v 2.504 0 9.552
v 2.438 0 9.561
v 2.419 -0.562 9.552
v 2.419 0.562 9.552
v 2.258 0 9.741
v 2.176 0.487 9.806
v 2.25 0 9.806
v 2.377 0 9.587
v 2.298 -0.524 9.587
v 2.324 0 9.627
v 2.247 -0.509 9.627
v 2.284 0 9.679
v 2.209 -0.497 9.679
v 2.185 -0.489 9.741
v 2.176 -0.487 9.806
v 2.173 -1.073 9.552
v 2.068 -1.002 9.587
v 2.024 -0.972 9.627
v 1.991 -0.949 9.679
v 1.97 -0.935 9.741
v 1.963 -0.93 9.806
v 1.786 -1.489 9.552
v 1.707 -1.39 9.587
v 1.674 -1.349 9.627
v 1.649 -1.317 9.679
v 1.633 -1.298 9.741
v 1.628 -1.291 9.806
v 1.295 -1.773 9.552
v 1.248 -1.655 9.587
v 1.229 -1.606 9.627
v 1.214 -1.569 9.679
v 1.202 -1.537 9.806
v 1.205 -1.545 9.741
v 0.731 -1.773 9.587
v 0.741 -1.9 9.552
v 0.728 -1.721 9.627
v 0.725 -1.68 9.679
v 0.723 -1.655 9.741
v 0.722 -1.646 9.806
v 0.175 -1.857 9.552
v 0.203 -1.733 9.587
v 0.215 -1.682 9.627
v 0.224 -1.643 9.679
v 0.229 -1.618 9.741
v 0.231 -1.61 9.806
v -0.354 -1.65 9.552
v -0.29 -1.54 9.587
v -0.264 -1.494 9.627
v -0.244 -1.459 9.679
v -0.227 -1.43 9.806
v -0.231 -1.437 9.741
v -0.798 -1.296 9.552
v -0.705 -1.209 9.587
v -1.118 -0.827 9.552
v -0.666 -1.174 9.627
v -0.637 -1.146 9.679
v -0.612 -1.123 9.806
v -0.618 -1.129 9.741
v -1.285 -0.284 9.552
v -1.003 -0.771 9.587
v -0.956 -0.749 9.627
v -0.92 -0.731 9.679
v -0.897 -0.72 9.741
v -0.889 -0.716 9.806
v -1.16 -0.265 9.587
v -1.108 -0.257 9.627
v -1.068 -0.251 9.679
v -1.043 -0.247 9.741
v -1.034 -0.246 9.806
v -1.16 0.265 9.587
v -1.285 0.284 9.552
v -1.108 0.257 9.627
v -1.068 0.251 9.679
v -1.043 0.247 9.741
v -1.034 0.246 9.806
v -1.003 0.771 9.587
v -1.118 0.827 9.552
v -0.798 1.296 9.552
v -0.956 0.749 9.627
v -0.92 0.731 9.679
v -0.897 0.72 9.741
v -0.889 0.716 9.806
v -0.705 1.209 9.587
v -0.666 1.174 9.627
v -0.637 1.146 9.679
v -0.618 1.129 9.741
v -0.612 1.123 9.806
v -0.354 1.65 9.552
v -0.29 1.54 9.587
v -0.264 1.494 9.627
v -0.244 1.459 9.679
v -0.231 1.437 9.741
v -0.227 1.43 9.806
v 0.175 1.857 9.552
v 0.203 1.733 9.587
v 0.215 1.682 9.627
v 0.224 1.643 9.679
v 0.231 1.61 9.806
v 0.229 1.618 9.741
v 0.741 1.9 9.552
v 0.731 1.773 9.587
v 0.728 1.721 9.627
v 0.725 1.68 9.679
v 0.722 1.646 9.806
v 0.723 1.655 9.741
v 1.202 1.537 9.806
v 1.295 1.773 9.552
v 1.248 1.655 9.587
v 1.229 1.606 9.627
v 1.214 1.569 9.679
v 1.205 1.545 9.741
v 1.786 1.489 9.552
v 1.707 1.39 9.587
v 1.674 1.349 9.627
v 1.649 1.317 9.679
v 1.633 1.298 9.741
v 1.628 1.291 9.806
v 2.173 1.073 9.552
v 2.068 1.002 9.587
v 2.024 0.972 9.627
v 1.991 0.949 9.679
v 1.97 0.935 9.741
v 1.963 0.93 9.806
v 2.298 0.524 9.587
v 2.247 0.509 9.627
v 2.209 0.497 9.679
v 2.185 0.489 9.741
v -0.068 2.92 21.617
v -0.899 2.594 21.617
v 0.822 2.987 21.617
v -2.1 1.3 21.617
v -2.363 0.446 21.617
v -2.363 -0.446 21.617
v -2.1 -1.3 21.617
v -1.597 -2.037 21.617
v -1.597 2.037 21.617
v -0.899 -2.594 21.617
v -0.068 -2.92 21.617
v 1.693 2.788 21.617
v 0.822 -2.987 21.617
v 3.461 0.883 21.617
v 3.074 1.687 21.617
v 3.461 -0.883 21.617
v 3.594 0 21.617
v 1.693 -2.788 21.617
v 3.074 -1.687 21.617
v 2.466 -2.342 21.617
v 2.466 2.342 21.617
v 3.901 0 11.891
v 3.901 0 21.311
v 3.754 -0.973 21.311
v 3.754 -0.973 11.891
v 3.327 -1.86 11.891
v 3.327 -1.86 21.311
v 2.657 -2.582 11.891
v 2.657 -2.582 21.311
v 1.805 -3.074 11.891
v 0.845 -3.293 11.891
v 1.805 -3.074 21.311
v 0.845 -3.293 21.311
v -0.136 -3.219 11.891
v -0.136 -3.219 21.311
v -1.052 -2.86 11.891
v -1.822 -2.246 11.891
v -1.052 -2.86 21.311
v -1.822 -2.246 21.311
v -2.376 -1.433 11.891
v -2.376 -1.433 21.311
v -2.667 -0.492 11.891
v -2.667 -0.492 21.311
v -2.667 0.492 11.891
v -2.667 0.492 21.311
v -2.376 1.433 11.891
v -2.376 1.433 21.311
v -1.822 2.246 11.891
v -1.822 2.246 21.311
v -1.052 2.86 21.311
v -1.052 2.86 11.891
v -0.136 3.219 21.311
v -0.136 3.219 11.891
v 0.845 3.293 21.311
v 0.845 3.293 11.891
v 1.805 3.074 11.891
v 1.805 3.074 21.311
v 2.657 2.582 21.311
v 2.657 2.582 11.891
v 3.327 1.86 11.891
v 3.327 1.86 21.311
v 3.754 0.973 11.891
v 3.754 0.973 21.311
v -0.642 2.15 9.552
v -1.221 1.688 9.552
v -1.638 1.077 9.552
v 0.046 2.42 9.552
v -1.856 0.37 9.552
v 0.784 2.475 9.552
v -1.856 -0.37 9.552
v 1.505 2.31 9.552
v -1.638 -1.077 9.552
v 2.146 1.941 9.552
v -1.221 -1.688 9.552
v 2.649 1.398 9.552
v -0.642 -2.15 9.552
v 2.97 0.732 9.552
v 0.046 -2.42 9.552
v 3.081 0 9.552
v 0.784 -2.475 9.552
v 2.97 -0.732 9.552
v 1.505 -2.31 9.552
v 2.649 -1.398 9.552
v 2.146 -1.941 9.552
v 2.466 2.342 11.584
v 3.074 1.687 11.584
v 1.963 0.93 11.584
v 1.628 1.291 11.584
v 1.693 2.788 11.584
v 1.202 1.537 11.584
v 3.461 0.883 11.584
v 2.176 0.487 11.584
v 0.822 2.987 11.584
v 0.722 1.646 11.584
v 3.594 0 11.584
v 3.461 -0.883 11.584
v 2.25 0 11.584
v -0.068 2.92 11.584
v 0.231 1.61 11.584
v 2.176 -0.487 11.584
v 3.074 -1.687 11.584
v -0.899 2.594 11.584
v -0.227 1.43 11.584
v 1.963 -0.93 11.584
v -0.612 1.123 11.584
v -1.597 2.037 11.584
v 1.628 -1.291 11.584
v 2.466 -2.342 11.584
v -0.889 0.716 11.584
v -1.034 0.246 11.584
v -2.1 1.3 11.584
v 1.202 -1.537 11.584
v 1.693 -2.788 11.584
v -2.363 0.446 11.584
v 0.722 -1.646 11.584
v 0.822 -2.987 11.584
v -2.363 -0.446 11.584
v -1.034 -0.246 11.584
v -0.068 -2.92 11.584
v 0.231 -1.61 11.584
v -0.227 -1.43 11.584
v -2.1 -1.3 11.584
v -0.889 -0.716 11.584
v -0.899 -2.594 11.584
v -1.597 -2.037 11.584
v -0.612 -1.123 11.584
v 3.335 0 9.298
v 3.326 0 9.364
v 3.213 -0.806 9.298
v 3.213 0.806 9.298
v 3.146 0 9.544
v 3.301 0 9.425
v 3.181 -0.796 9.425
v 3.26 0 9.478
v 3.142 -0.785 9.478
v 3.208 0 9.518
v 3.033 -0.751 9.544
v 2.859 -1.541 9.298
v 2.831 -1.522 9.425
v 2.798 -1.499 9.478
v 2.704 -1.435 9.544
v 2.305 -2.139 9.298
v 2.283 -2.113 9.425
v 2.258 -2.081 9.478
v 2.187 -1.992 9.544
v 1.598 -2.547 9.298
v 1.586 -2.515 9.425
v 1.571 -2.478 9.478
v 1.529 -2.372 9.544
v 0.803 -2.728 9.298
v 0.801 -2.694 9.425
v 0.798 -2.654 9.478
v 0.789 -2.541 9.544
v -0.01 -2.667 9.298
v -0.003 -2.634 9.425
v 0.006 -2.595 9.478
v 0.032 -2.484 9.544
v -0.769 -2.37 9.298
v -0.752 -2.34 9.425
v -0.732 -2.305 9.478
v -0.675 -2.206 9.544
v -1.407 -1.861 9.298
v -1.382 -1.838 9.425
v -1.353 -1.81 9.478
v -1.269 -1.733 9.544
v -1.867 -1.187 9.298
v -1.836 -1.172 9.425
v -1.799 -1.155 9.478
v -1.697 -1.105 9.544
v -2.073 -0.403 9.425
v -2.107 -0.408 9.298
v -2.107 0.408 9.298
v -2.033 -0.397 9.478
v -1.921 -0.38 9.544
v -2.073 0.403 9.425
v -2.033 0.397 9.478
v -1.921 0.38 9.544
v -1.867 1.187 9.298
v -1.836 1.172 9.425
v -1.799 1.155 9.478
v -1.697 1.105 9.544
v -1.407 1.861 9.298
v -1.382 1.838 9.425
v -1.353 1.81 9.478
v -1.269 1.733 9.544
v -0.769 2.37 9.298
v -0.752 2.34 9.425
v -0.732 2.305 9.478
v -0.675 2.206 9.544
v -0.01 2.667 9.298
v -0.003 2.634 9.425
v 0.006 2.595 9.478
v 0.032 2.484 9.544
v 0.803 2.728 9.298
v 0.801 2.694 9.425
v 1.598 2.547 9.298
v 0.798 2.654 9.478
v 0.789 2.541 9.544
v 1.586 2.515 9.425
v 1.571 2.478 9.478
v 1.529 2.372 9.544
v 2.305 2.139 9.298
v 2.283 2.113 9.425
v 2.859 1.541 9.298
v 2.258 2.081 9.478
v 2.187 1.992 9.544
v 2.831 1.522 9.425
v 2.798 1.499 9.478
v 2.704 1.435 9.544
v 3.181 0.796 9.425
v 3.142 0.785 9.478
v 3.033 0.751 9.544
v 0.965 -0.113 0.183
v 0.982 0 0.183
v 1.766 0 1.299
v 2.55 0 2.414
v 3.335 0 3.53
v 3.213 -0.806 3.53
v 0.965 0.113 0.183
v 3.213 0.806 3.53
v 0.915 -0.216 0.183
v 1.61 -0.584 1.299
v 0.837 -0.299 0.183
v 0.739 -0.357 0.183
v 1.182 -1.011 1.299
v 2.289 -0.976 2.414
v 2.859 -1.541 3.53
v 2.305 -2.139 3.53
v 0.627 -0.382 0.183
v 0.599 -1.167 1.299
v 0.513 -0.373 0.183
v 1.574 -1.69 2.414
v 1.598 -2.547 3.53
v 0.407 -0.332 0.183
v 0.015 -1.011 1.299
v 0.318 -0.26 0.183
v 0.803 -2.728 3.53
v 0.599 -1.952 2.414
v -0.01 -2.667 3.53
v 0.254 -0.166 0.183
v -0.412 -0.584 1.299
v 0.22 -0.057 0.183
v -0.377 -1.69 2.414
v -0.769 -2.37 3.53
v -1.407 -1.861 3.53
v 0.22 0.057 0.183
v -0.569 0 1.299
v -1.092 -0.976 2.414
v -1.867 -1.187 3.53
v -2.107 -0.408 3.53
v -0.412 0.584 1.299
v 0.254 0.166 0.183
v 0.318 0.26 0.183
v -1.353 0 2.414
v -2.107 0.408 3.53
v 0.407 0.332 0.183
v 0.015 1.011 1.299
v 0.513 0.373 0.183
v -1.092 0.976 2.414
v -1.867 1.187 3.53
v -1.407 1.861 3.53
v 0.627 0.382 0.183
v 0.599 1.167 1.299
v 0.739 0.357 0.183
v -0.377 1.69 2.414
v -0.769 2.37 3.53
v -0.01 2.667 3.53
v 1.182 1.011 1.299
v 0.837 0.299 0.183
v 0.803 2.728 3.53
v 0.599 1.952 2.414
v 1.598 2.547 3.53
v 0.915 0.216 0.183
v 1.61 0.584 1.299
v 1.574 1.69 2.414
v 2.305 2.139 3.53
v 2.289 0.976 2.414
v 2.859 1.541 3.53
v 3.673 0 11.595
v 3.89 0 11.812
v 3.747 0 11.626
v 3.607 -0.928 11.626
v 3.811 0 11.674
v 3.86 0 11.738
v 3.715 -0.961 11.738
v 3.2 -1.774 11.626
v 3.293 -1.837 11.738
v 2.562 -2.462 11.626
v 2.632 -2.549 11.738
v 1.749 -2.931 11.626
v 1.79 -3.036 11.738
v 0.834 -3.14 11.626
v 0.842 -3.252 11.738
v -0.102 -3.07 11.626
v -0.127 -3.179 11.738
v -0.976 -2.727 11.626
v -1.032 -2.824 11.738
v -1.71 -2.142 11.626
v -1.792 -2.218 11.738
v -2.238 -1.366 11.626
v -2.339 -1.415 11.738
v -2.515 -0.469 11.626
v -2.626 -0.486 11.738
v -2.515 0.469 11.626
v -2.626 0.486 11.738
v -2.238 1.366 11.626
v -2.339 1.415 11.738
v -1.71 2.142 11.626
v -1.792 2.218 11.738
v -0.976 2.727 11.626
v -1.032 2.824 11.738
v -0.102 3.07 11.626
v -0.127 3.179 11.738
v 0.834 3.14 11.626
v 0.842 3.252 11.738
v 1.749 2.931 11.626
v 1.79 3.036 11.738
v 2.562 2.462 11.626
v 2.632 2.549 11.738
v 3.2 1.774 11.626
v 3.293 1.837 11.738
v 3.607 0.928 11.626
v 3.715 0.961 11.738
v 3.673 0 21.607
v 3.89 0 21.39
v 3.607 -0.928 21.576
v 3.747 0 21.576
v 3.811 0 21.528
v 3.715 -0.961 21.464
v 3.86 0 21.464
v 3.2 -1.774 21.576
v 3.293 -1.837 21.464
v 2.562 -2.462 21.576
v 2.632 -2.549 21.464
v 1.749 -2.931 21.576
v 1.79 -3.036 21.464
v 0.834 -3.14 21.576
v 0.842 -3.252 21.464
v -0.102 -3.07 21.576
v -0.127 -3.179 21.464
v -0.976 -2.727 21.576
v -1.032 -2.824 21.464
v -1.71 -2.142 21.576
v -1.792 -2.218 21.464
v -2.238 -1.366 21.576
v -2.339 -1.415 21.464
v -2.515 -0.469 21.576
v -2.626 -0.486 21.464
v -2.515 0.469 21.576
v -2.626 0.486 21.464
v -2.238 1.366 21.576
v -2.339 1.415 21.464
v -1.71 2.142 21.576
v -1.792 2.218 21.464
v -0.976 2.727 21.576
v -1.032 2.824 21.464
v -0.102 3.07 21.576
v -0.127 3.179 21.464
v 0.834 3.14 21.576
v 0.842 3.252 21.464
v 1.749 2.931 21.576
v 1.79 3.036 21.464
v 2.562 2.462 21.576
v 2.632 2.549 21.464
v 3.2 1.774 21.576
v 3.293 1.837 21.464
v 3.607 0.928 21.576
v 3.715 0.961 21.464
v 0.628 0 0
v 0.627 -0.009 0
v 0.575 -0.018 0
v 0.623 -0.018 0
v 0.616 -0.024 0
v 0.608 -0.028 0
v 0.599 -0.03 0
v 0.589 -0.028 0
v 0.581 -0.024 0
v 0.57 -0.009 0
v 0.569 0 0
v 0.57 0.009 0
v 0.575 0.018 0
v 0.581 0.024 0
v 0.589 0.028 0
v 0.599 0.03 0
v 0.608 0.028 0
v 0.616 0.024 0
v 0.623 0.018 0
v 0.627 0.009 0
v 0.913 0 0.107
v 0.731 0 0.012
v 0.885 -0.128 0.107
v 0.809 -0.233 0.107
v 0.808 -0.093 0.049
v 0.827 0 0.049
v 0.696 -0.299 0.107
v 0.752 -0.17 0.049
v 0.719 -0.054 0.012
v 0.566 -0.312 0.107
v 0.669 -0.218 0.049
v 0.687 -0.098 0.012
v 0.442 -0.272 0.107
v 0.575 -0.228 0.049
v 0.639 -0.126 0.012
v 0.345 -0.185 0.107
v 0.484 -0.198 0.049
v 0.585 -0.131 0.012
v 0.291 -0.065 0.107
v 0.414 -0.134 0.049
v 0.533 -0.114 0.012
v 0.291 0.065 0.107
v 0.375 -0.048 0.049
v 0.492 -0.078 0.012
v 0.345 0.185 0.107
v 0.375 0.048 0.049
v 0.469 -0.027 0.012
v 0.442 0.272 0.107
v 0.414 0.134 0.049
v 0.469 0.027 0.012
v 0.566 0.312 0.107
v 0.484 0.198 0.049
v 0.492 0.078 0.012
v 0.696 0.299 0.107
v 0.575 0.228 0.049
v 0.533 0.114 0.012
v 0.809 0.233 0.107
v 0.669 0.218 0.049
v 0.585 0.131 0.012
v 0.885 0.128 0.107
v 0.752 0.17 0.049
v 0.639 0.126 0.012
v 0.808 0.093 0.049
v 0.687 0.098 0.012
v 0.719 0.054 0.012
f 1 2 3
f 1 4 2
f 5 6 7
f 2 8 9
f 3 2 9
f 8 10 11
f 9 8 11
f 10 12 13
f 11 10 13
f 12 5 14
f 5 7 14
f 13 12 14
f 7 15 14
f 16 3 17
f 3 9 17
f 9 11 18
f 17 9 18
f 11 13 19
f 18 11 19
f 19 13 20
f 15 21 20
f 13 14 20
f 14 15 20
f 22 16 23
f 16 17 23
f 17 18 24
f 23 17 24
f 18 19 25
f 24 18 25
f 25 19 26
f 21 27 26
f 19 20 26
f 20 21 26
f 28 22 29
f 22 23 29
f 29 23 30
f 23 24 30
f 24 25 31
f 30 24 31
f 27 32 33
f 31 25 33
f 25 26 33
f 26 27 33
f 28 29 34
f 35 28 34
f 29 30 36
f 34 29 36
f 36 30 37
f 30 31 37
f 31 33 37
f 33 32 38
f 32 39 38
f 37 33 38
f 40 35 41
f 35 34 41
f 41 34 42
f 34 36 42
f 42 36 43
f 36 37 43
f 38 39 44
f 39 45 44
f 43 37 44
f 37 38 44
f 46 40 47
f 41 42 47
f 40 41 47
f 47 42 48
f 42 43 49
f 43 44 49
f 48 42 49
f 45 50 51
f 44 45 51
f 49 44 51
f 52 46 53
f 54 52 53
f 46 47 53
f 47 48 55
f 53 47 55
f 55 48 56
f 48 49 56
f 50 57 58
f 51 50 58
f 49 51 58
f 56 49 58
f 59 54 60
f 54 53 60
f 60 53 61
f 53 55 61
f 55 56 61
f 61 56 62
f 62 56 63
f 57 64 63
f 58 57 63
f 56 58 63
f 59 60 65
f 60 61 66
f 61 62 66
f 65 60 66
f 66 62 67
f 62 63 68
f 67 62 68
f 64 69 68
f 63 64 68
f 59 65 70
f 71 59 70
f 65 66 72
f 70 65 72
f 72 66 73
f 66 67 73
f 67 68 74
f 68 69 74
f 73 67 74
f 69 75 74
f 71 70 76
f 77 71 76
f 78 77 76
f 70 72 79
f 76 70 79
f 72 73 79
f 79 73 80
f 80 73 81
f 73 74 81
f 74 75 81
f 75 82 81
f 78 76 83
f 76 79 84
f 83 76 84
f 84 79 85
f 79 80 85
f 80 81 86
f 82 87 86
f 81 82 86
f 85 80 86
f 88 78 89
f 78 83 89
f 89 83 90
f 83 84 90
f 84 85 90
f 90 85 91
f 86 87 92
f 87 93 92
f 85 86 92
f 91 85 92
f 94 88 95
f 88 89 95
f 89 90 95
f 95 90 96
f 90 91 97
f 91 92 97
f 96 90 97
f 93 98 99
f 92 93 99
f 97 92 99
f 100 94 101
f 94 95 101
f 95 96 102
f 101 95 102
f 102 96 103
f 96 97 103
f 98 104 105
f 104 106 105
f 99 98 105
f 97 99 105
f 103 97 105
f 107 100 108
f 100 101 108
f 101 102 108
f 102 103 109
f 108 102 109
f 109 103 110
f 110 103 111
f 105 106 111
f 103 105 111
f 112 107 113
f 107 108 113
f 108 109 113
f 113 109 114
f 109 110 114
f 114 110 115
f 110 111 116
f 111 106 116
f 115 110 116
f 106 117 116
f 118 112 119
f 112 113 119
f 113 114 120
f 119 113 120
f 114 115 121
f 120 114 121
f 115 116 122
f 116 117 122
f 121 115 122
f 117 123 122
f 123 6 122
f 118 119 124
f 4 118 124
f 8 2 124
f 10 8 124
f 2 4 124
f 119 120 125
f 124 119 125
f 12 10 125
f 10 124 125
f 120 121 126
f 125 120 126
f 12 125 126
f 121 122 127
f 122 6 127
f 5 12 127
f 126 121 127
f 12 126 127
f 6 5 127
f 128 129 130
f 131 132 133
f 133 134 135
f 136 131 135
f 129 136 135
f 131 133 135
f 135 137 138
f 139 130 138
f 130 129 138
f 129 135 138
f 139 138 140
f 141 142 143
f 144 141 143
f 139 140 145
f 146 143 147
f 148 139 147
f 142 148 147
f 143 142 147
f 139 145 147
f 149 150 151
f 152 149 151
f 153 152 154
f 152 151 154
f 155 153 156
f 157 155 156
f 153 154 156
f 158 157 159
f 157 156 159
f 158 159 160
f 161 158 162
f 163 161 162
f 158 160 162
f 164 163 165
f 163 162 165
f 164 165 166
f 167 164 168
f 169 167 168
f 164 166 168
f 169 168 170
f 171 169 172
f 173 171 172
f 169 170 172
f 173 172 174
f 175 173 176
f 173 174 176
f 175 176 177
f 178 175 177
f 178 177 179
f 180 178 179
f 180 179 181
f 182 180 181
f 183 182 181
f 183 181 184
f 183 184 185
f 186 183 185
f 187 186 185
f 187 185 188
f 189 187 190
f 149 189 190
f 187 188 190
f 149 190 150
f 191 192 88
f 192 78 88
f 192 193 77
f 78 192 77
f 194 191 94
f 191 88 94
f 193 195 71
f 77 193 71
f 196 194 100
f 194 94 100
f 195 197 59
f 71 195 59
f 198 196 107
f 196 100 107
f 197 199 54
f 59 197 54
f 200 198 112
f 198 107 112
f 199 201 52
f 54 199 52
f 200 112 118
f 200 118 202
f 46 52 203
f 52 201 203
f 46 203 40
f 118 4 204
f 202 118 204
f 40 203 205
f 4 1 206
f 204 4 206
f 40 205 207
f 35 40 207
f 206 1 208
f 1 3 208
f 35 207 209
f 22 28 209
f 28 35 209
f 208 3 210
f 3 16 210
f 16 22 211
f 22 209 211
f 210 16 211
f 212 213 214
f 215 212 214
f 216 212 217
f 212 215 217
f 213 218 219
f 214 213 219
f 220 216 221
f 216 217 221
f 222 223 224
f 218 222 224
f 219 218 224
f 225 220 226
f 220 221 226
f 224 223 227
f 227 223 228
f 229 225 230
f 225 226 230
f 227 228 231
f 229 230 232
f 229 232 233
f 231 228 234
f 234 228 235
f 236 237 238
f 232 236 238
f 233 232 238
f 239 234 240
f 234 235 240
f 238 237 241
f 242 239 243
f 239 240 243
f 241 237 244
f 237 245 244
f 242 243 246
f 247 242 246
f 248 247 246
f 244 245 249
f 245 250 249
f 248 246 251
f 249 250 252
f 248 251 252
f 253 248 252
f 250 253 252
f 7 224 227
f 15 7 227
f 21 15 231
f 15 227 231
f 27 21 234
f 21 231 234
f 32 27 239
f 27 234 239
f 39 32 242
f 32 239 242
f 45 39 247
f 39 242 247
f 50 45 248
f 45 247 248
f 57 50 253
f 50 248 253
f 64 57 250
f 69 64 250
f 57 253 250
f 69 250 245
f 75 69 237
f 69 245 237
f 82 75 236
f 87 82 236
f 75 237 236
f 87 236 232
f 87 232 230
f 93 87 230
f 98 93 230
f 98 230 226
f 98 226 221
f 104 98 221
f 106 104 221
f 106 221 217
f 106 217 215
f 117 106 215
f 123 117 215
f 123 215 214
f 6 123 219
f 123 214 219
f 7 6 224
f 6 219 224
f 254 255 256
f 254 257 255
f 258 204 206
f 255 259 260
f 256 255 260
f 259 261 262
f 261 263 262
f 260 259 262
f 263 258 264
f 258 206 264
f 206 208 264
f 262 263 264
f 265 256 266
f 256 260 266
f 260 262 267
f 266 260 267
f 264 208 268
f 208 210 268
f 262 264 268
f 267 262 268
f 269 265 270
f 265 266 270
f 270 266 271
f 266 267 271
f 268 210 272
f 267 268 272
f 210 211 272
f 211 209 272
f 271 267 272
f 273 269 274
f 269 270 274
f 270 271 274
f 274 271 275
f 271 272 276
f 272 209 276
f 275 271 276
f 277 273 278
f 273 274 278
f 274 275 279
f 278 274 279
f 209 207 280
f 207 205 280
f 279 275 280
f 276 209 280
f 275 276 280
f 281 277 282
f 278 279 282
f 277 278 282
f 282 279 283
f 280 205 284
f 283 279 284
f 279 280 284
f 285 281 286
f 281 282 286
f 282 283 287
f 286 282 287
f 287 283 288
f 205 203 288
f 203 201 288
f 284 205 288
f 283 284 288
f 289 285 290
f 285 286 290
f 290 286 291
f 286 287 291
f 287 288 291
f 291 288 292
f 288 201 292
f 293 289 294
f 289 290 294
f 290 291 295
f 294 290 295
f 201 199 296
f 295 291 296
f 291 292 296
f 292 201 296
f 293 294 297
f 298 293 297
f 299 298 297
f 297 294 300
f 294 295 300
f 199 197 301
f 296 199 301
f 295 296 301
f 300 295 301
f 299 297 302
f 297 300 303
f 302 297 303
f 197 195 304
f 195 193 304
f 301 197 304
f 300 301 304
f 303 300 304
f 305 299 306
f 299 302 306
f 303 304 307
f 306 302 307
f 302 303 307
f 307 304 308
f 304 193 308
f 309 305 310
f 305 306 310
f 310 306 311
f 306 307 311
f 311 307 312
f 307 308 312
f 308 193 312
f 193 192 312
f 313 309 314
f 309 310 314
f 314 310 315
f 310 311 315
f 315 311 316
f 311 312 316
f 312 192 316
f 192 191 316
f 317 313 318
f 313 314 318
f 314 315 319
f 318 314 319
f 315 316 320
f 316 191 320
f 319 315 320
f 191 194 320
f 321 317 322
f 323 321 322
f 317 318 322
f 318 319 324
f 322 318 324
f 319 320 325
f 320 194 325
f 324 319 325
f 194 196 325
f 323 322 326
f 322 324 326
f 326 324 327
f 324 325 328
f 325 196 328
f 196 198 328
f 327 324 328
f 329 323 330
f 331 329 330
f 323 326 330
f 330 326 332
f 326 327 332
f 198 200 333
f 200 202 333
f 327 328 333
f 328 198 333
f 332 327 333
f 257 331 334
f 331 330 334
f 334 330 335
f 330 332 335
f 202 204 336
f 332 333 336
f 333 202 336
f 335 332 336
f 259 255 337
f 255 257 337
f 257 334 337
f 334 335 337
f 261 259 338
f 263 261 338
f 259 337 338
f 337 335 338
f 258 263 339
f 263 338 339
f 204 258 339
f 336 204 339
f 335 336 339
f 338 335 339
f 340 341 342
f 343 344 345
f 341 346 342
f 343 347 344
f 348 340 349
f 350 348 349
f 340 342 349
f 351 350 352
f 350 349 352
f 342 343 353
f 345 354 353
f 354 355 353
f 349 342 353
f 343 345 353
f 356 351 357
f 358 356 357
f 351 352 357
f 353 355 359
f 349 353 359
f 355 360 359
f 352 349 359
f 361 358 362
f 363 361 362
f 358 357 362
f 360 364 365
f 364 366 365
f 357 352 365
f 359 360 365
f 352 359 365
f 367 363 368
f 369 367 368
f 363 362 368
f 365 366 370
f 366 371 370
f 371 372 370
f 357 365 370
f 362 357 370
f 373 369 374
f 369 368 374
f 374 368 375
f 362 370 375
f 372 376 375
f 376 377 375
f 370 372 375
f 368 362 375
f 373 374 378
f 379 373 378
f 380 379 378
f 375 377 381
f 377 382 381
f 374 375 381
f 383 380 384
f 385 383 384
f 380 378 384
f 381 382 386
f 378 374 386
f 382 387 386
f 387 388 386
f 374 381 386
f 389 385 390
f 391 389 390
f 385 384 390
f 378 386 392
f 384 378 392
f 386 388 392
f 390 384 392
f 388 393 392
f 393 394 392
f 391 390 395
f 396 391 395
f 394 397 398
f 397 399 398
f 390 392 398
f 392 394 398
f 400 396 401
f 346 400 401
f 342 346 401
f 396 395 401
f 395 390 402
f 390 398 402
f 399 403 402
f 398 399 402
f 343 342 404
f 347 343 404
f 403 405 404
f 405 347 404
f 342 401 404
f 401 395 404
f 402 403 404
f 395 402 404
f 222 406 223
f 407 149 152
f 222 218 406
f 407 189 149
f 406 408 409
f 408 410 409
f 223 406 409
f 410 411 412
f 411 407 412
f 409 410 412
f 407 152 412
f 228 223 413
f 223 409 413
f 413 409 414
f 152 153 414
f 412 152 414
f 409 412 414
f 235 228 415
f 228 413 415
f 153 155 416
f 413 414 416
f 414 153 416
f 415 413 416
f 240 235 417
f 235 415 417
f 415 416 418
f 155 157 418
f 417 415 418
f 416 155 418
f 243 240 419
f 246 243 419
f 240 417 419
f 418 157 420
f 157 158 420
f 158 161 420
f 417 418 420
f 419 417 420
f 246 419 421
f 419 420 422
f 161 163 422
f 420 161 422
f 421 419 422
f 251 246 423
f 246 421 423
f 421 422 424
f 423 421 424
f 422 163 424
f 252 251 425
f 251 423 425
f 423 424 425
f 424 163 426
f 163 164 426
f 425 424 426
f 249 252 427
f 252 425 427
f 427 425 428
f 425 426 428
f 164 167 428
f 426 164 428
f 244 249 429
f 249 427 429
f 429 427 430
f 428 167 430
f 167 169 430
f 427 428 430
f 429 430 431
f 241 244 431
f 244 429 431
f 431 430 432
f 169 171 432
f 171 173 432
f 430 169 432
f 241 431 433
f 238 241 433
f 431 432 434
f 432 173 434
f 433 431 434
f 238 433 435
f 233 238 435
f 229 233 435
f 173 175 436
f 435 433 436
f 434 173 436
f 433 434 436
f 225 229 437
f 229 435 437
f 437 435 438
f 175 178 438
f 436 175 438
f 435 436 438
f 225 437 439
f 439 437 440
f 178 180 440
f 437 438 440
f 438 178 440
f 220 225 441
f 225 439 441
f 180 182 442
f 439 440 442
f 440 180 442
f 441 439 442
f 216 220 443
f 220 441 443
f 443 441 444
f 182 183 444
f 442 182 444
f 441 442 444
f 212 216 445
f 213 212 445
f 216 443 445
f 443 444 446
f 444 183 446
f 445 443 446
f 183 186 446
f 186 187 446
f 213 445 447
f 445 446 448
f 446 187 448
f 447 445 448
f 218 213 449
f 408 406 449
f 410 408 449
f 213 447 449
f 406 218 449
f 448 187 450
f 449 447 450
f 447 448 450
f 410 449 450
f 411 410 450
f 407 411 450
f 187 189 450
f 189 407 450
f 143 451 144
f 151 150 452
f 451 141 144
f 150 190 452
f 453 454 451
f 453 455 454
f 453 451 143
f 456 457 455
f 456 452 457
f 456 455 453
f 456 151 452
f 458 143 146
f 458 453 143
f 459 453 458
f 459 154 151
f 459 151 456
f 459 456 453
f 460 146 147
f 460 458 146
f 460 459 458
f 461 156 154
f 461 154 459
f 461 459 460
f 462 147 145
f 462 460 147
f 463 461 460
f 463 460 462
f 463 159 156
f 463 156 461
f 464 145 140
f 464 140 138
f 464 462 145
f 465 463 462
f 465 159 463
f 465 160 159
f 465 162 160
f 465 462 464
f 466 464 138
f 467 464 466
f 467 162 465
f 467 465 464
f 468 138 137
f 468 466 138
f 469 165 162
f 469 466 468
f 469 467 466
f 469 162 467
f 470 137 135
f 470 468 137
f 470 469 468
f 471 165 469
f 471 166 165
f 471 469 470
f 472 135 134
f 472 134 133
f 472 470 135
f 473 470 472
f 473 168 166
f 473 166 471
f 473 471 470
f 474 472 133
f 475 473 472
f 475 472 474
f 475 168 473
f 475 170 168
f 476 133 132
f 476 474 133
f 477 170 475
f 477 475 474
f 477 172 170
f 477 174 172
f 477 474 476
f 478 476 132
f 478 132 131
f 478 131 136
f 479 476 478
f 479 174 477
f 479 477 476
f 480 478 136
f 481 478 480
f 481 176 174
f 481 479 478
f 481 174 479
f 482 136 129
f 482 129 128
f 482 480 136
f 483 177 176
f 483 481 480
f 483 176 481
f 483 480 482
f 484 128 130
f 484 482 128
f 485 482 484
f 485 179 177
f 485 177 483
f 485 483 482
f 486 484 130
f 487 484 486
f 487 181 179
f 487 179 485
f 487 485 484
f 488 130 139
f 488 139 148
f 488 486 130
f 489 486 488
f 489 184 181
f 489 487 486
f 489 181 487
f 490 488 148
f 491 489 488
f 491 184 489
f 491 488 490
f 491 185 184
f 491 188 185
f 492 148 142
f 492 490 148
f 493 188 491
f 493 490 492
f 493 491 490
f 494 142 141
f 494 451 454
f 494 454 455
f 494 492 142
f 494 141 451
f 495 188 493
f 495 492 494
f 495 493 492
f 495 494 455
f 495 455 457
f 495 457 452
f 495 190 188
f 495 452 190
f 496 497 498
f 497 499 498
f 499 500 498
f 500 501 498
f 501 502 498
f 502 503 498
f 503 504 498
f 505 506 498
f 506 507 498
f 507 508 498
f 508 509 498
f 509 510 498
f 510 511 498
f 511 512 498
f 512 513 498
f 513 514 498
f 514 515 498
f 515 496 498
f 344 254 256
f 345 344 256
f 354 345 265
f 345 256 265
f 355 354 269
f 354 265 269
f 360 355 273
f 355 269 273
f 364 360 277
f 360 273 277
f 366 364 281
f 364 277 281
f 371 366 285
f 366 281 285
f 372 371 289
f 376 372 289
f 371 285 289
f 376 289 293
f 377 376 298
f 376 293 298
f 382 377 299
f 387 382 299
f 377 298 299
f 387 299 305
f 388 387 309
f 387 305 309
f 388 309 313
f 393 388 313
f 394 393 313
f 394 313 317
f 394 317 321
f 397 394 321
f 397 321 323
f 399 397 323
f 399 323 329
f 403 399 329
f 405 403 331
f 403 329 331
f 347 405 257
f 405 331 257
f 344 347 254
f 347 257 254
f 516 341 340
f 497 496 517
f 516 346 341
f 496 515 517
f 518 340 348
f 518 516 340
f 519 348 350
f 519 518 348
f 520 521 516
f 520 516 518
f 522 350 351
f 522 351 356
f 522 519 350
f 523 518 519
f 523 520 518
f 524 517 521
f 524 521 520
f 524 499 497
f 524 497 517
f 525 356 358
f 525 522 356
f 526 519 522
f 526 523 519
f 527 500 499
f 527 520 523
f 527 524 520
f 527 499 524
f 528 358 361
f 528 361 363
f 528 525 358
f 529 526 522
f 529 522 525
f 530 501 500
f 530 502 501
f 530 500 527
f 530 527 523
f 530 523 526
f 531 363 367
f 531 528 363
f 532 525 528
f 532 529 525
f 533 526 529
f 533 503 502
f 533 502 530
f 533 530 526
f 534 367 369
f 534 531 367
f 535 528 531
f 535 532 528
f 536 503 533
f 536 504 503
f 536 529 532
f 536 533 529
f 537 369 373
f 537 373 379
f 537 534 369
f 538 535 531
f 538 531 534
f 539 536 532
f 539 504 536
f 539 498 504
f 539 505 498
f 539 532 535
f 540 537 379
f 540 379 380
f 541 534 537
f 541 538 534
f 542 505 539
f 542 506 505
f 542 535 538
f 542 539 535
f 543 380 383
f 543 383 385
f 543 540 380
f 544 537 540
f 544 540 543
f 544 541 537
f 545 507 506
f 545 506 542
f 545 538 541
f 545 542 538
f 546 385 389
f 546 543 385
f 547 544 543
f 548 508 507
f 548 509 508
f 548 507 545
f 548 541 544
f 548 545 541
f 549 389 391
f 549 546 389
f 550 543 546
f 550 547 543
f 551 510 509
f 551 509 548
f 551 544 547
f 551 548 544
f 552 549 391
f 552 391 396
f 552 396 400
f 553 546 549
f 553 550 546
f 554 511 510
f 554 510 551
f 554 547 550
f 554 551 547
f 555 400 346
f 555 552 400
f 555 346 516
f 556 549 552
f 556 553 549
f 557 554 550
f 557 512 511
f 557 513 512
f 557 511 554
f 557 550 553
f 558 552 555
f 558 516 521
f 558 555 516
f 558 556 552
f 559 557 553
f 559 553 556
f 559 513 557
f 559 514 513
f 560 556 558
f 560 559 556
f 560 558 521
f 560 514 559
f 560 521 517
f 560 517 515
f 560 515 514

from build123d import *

# Parameters (mm, degrees)
F2_R = 0.3066051224
F3_R = 0.4318
F4_R = 0.254


# Not quite as in the source:
# - a feature names something its author has since deleted; it is built from what else it names


with BuildPart() as f1:
    # F0 (on Front) → F1 (revolve)
    with BuildSketch(Plane.XZ):
        Polygon((3.9006043464, 21.6174807614), (0.5986043464, 21.6174807614), (0.5986043464, 0), (0.8526043464, 0), (3.3346717246, 3.5295289444), (3.3346717246, 9.5524807614), (2.2496043464, 9.5524807614), (2.2496043464, 11.5844807614), (3.9006043464, 11.5844807614), align=None)
    revolve(axis=Axis((0.5986043464, 0, 10.8087403807), (0, 0, -1)))

    # F2
    f2_edges = [f1.edges().sort_by_distance(p)[0] for p in [
        (-2.703396, 0, 21.617481),
        (-2.703396, 0, 11.584481),
    ]]
    fillet(f2_edges, radius=F2_R)

    # F3
    f3_edges = [f1.edges().sort_by_distance(p)[0] for p in [
        (0.344604, 0, 0),
    ]]
    fillet(f3_edges, radius=F3_R)

    # F4
    f4_edges = [f1.edges().sort_by_distance(p)[0] for p in [
        (-2.137463, 0, 9.552481),
        (-1.052396, 0, 9.552481),
    ]]
    fillet(f4_edges, radius=F4_R)


solid = f1.part
